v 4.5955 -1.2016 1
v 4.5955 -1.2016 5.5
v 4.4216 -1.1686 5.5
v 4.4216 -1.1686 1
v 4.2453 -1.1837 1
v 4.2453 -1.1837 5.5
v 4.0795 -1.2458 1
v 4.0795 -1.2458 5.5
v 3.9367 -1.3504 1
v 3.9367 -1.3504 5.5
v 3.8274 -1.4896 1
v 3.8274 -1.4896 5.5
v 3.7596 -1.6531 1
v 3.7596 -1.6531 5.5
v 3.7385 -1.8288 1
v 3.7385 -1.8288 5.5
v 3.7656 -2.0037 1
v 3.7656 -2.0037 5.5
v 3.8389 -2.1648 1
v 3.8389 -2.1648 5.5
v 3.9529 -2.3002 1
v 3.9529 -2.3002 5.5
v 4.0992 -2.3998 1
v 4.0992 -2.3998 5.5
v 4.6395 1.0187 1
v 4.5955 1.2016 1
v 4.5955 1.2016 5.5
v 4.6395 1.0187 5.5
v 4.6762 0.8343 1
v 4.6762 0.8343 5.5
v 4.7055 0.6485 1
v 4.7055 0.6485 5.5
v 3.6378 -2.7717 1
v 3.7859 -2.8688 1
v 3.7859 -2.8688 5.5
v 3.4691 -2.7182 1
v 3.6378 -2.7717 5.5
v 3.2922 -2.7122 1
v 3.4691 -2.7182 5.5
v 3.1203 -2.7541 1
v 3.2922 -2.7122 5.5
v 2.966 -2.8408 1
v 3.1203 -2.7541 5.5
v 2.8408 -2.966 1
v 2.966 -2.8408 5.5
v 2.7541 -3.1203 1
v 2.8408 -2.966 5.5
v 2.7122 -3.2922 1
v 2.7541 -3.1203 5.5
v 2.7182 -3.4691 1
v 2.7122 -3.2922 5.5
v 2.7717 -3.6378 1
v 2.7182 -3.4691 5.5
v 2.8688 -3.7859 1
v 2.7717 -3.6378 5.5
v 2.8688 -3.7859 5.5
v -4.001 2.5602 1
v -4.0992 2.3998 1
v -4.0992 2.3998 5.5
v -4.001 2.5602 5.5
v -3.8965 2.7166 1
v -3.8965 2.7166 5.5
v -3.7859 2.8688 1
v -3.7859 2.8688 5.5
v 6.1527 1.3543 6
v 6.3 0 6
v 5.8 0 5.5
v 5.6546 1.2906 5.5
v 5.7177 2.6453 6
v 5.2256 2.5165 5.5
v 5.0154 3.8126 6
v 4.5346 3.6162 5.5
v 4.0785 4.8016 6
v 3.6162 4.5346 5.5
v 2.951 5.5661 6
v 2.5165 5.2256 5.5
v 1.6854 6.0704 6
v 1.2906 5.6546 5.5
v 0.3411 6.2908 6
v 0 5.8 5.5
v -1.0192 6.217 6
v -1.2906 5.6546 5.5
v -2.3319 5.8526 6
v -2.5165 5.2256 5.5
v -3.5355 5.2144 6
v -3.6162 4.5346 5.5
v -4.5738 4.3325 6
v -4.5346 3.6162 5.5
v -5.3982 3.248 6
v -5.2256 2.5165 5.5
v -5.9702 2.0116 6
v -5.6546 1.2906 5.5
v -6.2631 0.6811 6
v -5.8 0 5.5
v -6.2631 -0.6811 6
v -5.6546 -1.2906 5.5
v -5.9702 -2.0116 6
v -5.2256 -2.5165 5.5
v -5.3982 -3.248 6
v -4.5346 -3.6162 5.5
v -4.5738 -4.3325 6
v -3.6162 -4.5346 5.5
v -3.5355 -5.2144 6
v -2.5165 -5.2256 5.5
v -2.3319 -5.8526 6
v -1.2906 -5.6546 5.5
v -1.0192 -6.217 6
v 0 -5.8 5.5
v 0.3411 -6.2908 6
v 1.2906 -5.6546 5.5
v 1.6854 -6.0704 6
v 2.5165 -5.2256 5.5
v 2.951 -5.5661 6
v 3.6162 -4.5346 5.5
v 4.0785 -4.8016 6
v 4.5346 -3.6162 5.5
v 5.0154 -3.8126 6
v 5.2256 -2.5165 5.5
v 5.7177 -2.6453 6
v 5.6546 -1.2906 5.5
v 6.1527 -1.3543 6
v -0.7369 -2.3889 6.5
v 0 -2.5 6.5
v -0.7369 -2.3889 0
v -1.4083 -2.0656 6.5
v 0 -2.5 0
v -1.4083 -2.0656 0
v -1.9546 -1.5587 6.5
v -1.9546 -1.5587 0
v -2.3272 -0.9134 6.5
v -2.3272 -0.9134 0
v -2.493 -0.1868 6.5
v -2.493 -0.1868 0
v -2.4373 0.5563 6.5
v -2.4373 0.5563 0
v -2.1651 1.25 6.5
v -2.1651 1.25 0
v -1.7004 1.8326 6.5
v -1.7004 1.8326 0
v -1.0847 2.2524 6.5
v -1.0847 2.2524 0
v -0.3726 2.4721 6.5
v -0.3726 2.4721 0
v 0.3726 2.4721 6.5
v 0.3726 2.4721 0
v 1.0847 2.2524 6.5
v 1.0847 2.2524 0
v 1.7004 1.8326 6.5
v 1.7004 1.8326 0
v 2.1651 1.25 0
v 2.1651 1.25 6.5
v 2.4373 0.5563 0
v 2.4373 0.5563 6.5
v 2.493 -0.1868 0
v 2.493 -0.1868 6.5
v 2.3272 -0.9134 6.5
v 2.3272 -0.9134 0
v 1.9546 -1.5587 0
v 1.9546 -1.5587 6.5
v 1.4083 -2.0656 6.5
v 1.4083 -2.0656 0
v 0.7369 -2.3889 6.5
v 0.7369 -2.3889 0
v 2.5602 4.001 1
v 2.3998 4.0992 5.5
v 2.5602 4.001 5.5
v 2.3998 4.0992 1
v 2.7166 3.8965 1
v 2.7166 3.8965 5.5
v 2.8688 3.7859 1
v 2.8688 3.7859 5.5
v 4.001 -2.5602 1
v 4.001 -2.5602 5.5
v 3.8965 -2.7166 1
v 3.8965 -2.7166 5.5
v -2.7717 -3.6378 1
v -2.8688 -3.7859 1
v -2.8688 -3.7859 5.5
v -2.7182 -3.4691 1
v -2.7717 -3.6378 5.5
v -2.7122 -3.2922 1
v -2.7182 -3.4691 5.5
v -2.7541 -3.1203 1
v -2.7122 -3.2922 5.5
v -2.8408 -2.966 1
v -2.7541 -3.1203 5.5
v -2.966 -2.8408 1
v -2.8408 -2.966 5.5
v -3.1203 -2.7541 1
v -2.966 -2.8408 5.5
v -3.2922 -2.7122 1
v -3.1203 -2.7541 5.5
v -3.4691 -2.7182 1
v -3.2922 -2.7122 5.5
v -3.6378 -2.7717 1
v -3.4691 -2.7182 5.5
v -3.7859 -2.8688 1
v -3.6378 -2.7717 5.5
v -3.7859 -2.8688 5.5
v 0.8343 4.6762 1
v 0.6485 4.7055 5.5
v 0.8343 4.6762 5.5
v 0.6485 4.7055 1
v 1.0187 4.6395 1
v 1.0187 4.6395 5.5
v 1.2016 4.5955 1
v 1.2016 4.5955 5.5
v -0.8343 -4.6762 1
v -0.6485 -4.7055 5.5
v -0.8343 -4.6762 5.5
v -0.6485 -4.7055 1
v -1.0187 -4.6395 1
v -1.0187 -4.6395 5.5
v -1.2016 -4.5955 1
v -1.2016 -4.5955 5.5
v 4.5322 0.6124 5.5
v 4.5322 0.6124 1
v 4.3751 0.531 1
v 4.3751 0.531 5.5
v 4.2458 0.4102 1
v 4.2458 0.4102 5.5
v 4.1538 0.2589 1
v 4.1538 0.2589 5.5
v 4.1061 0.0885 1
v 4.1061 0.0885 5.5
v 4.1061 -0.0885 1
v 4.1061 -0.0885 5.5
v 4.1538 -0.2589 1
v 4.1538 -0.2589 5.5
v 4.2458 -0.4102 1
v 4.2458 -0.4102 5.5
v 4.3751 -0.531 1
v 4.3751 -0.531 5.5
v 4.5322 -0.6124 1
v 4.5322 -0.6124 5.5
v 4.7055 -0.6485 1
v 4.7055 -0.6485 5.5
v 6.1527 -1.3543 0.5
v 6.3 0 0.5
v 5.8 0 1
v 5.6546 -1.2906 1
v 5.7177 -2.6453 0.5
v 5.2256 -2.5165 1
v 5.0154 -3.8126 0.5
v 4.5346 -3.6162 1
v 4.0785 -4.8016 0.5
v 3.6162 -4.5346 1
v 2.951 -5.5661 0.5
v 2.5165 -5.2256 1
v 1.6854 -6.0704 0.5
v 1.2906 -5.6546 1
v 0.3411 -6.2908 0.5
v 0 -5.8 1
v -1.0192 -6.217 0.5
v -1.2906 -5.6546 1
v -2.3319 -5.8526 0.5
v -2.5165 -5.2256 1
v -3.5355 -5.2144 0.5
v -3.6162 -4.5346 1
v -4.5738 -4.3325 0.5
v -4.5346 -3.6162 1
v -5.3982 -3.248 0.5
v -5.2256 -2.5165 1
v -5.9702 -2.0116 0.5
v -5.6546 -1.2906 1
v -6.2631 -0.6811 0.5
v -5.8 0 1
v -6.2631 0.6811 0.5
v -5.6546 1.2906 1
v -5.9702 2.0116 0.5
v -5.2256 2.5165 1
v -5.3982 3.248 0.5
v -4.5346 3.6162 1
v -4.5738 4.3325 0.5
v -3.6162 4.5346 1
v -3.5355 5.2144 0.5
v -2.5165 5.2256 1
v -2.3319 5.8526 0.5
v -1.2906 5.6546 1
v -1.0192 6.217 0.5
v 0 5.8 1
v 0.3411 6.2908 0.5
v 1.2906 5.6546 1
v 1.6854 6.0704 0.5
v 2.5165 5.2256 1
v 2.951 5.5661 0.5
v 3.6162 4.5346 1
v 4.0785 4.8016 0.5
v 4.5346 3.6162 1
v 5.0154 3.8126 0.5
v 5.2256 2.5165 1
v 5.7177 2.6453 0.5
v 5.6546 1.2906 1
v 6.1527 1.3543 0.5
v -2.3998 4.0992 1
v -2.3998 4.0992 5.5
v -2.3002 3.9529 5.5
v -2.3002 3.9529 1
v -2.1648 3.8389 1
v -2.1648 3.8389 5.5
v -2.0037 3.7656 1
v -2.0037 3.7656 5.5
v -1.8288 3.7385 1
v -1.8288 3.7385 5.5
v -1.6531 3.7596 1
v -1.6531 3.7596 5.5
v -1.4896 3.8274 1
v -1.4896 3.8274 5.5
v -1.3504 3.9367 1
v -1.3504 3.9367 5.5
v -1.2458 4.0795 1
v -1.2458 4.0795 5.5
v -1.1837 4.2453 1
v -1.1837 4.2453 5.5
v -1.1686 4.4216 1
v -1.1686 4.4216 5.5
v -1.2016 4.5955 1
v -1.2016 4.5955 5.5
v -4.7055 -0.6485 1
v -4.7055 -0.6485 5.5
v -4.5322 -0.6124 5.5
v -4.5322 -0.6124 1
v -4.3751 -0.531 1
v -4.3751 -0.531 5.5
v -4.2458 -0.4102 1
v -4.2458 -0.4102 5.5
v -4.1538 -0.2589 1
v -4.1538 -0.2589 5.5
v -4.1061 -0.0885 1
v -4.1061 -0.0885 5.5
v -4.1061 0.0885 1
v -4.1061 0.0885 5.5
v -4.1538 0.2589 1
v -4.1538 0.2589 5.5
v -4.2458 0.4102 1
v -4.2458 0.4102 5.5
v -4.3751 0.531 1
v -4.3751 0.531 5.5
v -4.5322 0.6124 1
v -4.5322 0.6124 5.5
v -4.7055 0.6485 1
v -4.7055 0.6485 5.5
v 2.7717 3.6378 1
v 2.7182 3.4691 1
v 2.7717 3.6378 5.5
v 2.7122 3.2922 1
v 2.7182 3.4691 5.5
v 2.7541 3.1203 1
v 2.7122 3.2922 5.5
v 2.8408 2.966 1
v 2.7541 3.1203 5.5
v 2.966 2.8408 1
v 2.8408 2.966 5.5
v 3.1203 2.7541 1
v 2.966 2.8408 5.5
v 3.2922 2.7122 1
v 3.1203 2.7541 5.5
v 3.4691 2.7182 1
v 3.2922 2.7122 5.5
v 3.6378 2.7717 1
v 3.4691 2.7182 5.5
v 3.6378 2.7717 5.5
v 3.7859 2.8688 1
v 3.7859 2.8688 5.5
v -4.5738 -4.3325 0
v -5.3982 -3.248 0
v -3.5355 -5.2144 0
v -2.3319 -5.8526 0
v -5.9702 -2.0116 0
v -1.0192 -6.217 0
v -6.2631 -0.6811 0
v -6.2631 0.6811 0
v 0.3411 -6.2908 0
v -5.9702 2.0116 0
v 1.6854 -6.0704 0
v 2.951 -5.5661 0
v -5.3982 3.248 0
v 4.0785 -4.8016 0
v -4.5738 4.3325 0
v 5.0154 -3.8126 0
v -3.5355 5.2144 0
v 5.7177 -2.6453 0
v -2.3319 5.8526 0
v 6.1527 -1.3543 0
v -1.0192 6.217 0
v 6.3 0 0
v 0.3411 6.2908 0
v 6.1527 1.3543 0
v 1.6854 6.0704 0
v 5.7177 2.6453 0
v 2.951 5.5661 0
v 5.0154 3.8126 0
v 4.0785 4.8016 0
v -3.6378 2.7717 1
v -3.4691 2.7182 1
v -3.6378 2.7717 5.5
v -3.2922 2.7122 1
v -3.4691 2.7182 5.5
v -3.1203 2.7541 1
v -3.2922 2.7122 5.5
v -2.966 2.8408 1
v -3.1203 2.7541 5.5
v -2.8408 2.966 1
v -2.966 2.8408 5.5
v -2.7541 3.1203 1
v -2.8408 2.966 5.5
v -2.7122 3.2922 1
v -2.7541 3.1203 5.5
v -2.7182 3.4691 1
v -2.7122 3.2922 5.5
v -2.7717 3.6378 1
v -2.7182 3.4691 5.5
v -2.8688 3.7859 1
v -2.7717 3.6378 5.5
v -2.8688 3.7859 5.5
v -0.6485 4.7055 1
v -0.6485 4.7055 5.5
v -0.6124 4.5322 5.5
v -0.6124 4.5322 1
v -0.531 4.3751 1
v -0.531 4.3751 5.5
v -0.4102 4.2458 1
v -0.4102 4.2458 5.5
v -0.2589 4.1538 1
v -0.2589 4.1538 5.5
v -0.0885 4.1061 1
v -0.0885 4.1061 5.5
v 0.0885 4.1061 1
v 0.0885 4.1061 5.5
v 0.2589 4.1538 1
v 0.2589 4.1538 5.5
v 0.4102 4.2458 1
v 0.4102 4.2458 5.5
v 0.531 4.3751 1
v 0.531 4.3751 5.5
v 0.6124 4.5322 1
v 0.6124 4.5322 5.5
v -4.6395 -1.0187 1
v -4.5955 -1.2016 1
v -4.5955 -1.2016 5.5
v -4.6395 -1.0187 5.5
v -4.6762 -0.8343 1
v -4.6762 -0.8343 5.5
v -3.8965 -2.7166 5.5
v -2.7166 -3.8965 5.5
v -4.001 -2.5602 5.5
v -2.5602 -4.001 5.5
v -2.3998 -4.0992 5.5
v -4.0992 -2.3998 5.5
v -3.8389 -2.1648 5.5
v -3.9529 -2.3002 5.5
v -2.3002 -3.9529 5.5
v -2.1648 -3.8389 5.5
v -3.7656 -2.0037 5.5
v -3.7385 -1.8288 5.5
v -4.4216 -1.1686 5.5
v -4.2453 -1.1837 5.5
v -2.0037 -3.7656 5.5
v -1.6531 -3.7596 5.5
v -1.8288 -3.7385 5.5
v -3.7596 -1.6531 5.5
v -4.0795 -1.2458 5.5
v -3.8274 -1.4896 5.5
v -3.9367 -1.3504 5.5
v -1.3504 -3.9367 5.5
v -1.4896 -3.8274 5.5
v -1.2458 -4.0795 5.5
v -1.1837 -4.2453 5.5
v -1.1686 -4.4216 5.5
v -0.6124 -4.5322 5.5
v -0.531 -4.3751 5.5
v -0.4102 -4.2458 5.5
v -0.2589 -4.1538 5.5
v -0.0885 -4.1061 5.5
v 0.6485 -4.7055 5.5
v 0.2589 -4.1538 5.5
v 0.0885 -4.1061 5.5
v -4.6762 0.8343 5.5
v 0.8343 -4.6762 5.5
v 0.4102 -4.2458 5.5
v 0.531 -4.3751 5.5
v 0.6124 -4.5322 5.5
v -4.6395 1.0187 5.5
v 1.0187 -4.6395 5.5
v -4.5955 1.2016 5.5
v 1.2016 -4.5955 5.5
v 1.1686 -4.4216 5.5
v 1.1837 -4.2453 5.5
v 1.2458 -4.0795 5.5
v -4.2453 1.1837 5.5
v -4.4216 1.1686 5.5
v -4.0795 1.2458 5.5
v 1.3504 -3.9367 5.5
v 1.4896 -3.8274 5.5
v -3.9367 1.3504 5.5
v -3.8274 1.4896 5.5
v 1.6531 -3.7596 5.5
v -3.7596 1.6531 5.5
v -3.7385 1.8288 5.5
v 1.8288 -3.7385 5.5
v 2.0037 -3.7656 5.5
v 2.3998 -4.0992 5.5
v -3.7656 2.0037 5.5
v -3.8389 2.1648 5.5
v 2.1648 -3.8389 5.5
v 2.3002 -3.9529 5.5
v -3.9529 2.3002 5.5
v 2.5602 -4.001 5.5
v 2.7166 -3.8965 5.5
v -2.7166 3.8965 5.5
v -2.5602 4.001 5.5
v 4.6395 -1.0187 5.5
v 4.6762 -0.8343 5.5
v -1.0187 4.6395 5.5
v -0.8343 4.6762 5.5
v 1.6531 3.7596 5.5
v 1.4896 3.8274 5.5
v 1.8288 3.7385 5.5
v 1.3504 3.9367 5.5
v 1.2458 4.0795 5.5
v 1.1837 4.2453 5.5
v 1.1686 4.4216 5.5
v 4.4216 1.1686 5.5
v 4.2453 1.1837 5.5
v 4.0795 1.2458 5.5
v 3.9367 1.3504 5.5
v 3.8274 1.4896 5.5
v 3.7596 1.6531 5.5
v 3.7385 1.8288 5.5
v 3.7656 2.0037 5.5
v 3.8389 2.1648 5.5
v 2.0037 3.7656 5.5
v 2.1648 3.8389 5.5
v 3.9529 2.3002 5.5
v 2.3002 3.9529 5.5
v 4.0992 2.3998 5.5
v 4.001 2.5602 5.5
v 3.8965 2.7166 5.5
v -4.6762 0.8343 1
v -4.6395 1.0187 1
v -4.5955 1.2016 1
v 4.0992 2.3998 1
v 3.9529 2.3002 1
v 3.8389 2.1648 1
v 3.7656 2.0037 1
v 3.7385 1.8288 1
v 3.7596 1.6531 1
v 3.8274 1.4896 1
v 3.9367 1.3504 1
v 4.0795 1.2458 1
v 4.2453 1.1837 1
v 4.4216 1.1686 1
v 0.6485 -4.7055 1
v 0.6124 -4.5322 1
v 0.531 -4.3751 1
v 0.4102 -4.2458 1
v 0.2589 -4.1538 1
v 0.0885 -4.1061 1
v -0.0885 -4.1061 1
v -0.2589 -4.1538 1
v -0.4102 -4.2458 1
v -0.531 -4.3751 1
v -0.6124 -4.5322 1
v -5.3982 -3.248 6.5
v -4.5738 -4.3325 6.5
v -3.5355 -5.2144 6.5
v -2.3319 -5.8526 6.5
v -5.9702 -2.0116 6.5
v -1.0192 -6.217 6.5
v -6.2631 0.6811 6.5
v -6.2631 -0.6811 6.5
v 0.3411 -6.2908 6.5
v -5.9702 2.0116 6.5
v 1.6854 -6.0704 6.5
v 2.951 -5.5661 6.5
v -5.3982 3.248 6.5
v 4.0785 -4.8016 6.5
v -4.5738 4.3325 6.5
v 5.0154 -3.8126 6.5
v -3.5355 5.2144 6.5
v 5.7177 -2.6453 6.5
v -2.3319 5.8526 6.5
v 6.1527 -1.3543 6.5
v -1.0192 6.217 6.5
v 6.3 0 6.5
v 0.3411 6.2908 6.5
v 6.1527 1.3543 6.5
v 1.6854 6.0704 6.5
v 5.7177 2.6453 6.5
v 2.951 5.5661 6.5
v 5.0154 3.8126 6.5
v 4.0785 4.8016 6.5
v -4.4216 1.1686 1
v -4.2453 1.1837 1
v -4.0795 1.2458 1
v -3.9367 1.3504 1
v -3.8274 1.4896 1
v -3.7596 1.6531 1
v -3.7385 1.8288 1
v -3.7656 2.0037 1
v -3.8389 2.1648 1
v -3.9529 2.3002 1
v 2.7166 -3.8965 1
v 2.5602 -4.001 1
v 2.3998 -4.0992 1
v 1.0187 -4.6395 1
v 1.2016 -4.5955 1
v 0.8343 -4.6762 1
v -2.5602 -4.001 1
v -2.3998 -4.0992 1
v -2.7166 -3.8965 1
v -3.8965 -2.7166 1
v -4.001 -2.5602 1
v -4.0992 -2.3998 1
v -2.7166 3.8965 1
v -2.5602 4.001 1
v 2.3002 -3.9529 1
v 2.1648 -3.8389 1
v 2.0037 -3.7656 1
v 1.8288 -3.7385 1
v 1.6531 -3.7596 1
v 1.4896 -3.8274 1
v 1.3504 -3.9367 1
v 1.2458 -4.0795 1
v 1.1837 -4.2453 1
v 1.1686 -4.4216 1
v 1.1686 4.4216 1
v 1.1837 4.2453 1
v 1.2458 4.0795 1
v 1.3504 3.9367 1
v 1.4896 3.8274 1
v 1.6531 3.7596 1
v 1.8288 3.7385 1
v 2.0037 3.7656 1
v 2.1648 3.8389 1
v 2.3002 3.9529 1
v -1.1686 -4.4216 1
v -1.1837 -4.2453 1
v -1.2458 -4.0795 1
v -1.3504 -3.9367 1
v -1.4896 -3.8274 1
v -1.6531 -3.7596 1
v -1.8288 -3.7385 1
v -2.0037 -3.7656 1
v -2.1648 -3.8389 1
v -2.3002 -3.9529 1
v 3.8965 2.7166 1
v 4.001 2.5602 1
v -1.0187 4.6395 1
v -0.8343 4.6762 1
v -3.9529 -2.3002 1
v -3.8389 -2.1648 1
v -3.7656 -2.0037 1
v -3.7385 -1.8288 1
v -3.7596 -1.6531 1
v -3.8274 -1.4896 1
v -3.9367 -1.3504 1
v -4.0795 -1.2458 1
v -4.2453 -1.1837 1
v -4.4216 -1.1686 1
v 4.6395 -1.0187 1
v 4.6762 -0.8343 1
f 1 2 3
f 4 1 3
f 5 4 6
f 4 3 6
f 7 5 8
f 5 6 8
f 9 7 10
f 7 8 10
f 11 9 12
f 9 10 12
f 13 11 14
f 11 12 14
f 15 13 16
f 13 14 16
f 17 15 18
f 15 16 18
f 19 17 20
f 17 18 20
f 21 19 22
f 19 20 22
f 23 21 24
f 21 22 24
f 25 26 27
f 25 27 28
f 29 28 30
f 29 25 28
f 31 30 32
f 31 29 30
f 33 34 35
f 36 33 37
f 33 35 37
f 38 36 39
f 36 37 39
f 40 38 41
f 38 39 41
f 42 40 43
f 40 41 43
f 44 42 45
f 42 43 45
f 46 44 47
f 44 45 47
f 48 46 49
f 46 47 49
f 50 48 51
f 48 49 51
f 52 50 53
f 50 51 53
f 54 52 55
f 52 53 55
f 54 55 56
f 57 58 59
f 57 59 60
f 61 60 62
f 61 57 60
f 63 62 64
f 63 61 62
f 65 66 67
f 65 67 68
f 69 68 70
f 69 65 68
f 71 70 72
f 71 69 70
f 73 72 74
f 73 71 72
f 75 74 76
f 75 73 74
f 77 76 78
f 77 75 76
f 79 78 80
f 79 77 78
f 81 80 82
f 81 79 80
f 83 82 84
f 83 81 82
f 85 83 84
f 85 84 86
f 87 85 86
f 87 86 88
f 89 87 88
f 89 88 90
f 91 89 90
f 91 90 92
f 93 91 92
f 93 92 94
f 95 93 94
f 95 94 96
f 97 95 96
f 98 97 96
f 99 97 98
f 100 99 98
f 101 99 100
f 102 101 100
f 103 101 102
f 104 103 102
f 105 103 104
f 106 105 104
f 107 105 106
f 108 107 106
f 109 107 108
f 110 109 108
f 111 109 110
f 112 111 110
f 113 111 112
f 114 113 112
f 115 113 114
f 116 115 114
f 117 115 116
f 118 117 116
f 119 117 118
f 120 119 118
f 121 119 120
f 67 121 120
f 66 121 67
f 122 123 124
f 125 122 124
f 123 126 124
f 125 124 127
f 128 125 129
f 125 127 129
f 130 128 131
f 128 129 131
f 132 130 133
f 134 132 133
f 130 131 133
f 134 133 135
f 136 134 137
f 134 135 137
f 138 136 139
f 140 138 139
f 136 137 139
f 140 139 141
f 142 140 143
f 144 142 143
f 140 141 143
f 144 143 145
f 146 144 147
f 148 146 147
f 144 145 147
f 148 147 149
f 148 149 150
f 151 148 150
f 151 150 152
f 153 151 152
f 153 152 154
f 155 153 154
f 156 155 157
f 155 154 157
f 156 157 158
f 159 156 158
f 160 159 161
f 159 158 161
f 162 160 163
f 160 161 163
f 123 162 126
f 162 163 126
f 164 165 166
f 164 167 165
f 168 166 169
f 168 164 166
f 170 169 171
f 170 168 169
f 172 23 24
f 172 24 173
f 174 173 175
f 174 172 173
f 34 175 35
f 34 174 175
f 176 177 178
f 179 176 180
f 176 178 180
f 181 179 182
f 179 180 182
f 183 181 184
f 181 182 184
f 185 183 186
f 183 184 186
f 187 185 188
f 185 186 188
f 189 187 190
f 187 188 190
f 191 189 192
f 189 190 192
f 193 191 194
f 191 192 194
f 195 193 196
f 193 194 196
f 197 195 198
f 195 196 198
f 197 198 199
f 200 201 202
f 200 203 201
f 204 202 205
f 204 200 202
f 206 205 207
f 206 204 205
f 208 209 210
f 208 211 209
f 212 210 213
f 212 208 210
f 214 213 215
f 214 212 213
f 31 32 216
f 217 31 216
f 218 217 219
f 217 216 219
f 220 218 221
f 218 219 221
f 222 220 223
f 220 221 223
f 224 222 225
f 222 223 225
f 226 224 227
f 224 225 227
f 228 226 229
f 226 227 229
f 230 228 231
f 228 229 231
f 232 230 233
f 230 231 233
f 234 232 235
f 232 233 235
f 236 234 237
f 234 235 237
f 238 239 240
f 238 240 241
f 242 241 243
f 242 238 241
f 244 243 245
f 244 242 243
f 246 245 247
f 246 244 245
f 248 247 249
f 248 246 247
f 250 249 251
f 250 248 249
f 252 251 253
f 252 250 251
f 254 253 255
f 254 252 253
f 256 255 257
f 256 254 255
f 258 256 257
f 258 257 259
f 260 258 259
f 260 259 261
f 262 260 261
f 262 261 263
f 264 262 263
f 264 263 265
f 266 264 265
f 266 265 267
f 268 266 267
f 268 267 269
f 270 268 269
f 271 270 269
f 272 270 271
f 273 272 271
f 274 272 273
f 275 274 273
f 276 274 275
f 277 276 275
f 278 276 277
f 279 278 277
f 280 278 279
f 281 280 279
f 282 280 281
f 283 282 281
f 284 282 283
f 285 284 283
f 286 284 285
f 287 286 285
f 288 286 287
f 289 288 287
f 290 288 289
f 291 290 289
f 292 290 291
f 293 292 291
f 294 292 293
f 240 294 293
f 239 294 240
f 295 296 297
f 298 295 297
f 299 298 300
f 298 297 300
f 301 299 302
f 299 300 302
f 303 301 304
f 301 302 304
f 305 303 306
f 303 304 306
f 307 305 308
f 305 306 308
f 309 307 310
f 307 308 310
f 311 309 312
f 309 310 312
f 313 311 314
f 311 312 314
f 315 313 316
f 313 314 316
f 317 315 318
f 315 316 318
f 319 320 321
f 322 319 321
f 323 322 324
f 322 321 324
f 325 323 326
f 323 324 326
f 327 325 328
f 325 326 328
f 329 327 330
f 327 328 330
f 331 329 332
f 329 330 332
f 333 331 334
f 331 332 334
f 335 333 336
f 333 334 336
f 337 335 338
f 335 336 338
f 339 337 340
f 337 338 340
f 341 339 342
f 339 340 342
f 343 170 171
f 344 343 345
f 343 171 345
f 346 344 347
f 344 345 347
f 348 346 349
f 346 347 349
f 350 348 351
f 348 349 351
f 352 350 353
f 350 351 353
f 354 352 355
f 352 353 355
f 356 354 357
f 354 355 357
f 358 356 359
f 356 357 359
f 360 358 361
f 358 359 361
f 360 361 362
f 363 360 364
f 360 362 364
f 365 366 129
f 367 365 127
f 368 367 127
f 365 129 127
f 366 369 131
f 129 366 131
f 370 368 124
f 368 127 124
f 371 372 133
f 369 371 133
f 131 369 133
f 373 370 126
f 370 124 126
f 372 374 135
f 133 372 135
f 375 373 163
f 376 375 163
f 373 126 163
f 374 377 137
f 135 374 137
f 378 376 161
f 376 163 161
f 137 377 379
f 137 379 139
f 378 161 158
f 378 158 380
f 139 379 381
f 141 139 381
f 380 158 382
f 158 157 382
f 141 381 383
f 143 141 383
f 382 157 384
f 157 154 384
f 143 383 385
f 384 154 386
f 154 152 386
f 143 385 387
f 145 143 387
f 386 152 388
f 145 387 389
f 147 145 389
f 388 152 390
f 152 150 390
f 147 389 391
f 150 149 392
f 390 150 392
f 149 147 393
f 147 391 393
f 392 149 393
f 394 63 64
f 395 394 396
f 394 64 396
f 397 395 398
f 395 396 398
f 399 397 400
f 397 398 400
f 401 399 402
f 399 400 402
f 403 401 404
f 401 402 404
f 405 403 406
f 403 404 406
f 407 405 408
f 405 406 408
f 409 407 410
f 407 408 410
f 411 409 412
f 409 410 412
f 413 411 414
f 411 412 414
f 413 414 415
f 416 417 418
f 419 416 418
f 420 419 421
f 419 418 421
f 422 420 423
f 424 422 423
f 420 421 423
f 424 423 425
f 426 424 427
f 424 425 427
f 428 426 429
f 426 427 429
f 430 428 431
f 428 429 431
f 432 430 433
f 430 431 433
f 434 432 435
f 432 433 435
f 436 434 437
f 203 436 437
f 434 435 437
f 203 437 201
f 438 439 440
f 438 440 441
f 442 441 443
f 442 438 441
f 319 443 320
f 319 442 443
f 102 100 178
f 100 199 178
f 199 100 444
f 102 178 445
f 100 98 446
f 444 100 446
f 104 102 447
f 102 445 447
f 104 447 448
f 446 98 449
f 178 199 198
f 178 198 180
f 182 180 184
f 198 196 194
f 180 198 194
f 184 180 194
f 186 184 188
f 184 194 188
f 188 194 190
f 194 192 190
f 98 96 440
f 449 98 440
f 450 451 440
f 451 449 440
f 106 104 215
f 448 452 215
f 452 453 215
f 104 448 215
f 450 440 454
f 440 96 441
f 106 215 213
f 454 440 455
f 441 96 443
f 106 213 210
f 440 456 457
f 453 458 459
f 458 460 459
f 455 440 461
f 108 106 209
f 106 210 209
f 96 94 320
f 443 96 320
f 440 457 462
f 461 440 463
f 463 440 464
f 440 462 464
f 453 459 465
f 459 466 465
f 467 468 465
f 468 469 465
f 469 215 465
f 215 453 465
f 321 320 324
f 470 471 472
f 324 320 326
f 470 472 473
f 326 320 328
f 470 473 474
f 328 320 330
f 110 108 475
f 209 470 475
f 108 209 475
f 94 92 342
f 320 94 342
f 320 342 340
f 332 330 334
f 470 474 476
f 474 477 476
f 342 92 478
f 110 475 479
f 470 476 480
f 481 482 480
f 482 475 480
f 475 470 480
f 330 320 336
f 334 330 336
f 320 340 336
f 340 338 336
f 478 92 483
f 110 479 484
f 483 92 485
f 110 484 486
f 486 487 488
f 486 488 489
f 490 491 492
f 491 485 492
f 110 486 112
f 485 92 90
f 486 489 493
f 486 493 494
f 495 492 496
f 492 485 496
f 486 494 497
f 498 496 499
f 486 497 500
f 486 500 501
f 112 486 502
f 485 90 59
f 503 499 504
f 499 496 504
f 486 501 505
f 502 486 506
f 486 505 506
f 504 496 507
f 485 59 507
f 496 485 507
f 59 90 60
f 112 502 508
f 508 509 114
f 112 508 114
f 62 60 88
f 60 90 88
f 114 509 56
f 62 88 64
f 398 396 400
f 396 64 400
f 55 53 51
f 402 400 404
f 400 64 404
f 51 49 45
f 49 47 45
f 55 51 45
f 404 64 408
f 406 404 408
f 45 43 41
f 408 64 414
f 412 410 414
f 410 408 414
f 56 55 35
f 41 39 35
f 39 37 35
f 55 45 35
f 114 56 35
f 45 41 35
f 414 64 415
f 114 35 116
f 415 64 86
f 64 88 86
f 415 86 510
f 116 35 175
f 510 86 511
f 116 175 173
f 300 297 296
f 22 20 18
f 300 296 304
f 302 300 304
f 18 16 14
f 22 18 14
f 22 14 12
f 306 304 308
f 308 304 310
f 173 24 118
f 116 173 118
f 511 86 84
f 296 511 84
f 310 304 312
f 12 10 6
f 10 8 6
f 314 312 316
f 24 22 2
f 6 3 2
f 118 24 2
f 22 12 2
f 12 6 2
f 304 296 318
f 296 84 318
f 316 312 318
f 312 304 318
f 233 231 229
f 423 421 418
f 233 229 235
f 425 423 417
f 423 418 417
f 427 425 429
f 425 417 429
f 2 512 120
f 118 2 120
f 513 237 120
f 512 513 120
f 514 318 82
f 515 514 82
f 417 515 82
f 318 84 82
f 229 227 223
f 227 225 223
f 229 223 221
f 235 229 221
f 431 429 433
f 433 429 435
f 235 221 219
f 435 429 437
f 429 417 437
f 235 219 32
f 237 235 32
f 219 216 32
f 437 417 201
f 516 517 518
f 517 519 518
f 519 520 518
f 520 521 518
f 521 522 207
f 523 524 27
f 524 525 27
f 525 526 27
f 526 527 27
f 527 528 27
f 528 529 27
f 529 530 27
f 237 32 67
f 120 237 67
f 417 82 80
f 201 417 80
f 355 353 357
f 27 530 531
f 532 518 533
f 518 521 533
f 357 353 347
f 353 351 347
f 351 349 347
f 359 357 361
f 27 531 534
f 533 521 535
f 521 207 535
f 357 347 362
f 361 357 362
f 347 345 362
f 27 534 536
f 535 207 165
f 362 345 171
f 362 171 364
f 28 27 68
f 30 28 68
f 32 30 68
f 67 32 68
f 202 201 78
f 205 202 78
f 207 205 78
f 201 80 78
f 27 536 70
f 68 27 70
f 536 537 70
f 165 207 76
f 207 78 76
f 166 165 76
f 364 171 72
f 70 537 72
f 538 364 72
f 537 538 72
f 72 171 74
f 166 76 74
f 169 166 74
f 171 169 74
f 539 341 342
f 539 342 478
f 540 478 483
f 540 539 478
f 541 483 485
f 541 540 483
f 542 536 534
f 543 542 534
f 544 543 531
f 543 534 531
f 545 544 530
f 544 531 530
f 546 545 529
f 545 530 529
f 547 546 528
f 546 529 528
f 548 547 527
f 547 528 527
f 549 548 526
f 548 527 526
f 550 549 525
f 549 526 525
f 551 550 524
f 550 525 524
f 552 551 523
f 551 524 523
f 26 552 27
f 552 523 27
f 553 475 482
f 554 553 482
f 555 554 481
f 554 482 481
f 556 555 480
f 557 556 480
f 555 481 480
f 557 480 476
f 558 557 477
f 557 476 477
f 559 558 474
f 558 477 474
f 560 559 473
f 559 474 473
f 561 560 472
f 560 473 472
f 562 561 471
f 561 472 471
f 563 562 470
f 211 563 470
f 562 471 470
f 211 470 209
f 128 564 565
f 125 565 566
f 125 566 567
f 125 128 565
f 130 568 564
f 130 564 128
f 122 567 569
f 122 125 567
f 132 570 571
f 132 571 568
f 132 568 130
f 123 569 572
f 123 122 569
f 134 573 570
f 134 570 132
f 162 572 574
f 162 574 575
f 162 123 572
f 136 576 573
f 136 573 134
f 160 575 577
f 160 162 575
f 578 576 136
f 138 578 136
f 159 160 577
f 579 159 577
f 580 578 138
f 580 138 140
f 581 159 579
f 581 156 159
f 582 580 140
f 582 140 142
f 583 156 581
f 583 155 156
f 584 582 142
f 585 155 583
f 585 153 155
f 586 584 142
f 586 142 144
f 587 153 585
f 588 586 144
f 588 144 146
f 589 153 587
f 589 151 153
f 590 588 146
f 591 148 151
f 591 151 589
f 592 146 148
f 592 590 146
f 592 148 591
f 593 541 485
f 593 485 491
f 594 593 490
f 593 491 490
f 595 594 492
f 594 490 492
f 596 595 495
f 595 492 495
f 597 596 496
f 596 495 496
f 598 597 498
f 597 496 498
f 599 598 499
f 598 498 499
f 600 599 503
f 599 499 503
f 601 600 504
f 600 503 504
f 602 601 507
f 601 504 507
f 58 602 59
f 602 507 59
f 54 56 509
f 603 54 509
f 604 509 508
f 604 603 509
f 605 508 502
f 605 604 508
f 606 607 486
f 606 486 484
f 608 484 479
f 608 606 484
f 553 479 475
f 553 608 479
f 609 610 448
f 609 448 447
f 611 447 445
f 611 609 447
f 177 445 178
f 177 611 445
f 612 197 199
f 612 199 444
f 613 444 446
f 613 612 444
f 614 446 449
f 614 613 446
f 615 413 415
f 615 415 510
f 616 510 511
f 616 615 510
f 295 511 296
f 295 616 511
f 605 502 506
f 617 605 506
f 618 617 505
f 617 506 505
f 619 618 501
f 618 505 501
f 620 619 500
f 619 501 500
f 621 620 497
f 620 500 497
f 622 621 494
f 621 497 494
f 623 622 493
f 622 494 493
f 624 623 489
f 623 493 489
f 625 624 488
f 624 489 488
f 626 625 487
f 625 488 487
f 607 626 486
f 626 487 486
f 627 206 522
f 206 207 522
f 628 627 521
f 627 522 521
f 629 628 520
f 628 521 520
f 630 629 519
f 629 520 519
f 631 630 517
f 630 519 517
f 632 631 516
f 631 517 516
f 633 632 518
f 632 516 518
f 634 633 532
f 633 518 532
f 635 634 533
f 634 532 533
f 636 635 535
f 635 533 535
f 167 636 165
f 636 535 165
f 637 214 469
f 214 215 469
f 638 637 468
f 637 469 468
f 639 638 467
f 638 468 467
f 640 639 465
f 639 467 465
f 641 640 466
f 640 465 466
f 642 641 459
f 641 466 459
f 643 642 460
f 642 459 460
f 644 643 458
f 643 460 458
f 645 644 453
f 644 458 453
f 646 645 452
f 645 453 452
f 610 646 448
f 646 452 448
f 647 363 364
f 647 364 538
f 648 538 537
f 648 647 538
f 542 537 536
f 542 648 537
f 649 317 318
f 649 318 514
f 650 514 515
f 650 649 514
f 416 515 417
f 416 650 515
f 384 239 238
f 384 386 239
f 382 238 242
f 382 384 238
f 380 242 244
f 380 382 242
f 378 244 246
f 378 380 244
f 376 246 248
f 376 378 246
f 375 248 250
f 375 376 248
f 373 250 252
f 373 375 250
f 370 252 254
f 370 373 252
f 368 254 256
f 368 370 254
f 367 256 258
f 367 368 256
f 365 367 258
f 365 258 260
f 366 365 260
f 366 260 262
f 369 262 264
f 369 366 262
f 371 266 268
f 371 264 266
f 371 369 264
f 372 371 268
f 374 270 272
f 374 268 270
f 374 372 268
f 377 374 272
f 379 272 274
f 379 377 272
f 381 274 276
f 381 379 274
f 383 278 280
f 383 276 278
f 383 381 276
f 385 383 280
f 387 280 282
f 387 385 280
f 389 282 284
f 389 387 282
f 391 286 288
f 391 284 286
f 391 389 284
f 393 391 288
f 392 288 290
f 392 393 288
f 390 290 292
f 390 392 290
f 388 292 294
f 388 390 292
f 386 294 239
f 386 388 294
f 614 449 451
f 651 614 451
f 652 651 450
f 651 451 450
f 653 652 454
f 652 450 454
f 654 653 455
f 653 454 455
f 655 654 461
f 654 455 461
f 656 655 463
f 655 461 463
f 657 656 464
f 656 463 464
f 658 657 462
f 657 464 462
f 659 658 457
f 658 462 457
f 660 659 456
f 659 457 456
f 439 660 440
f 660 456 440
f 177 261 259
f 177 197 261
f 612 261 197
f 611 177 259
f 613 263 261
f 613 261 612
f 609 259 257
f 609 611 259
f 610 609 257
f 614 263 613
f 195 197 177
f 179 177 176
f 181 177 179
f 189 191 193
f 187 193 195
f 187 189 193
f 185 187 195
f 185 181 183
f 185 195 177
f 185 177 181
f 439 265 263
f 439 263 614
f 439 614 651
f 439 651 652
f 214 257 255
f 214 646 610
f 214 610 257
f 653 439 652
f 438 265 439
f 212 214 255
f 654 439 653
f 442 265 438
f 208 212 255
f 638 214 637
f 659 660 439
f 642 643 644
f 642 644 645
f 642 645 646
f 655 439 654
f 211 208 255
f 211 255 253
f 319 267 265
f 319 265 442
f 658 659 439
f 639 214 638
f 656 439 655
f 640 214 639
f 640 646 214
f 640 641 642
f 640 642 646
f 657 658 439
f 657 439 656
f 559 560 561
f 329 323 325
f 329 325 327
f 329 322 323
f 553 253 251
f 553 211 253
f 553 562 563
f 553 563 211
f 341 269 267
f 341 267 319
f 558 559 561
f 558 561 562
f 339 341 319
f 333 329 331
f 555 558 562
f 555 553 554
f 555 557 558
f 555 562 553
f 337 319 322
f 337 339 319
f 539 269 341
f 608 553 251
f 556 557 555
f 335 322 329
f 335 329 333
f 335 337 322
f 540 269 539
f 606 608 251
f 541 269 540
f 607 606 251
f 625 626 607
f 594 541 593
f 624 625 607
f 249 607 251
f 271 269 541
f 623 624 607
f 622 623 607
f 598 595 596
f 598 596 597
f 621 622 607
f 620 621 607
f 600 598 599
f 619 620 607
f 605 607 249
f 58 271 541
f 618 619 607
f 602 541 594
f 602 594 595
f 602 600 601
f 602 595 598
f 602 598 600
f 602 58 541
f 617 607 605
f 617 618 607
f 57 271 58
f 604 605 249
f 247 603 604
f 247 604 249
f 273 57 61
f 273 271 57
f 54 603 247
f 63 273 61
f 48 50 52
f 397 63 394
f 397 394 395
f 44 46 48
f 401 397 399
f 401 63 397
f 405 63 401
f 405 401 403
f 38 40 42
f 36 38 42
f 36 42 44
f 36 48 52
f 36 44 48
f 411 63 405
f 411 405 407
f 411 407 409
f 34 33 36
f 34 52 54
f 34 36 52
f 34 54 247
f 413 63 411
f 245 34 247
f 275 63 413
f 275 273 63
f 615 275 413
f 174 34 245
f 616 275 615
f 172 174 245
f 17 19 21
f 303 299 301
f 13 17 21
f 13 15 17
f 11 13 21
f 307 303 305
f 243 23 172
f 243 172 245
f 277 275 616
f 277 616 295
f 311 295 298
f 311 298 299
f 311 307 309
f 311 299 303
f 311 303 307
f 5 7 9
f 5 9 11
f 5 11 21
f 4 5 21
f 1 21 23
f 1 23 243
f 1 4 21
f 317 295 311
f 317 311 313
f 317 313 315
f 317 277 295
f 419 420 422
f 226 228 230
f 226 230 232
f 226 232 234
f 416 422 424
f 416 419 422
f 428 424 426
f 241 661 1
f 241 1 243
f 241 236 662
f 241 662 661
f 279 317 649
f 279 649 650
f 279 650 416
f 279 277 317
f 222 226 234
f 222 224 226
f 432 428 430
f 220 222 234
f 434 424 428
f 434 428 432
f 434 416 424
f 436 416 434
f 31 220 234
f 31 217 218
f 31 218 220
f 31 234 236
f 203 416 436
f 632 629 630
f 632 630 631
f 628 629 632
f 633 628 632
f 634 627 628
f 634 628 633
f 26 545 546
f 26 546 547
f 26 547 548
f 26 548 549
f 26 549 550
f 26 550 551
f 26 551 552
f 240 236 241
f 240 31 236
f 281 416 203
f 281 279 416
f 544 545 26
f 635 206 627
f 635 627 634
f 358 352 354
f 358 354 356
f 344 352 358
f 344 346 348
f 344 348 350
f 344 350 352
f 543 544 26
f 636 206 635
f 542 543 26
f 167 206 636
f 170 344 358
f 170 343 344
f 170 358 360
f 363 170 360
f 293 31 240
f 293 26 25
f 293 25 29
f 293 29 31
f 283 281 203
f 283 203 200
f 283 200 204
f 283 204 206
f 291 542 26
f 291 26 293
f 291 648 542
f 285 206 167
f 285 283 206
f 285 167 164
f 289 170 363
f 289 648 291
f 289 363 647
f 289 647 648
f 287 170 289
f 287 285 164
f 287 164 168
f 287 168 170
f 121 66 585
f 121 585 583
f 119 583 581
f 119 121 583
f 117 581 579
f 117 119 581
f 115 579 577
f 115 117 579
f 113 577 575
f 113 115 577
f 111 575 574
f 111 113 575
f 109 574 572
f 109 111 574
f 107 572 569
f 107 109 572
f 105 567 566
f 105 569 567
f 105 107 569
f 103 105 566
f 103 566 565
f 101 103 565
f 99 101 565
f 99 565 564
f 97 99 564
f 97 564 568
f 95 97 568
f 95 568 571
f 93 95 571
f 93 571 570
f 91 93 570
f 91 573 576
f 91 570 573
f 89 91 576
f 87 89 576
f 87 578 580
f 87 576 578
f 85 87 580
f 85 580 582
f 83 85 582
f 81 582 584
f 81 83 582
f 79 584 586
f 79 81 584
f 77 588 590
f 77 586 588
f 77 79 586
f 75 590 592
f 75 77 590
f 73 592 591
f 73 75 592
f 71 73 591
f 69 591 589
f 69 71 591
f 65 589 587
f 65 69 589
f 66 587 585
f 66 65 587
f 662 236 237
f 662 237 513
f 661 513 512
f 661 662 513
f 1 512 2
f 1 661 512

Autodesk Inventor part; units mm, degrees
ref_plane "YZ Plane" through (0, 0, 0) normal (1, 0, 0) x (0, 1, 0)
ref_plane "XZ Plane" through (0, 0, 0) normal (0, 1, 0) x (-1, 0, 0)
ref_plane "XY Plane" through (0, 0, 0) normal (0, 0, 1) x (1, 0, 0)
sketch "Sketch1" plane through (0, 0, 0) normal (0, 0, 1) x (1, 0, 0)
  circle A0 centre (0, 0) radius 6.3
  dimension "d0" = 12.6
extrude "Extrusion1" add sketch "Sketch1" along normal blind 1
sketch "Sketch2" plane through (0, 0, 1) normal (0, 0, 1) x (1, 0, 0)
  circle A0 centre (0, 0) radius 6.3 projected
  circle A1 centre (0, 0) radius 4.75
  dimension "d3" = 9.5
extrude "Extrusion2" add sketch "Sketch2" along normal blind 4.5 contours A1
sketch "Sketch3" plane through (0, 0, 5.5) normal (0, 0, 1) x (1, 0, 0)
  circle A0 centre (0, 0) radius 4.75 projected
  circle A1 centre (0, 4.75) radius 0.65
  dimension "d6" = 1.3
extrude "Extrusion3" cut sketch "Sketch3" against normal blind 4.5 contours A1 A0 | A0 A1 picked at (-0.025, 4.5315) picked at (0.0193, 4.9625)
pattern_circular "Circular Pattern1" count 16 over 360 about axis through (0, 0, 1) along (0, 0, 1) of "Extrusion3"
sketch "Sketch4" plane through (0, 0, 5.5) normal (0, 0, 1) x (1, 0, 0)
  arc A0 (2.8688, 3.7859) -> (2.3998, 4.0992) centre (0, 0) ccw projected
  circle A1 centre (0, 0) radius 6.3
  dimension "d12" = 12.6
extrude "Extrusion4" add sketch "Sketch4" along normal blind 1
sketch "Sketch5" plane through (0, 0, 6.5) normal (0, 0, 1) x (1, 0, 0)
  circle A0 centre (0, 0) radius 6.3 projected
hole "Hole1" at (0, 0, 6.5) direction (0, 0, -1) diameter 5 end through all
chamfer "Chamfer1" distance 0.5 angle 45 2 edges at (-6.3, 0, 5.5) (-6.3, 0, 1)
properties part number "stepper_gear_28"
